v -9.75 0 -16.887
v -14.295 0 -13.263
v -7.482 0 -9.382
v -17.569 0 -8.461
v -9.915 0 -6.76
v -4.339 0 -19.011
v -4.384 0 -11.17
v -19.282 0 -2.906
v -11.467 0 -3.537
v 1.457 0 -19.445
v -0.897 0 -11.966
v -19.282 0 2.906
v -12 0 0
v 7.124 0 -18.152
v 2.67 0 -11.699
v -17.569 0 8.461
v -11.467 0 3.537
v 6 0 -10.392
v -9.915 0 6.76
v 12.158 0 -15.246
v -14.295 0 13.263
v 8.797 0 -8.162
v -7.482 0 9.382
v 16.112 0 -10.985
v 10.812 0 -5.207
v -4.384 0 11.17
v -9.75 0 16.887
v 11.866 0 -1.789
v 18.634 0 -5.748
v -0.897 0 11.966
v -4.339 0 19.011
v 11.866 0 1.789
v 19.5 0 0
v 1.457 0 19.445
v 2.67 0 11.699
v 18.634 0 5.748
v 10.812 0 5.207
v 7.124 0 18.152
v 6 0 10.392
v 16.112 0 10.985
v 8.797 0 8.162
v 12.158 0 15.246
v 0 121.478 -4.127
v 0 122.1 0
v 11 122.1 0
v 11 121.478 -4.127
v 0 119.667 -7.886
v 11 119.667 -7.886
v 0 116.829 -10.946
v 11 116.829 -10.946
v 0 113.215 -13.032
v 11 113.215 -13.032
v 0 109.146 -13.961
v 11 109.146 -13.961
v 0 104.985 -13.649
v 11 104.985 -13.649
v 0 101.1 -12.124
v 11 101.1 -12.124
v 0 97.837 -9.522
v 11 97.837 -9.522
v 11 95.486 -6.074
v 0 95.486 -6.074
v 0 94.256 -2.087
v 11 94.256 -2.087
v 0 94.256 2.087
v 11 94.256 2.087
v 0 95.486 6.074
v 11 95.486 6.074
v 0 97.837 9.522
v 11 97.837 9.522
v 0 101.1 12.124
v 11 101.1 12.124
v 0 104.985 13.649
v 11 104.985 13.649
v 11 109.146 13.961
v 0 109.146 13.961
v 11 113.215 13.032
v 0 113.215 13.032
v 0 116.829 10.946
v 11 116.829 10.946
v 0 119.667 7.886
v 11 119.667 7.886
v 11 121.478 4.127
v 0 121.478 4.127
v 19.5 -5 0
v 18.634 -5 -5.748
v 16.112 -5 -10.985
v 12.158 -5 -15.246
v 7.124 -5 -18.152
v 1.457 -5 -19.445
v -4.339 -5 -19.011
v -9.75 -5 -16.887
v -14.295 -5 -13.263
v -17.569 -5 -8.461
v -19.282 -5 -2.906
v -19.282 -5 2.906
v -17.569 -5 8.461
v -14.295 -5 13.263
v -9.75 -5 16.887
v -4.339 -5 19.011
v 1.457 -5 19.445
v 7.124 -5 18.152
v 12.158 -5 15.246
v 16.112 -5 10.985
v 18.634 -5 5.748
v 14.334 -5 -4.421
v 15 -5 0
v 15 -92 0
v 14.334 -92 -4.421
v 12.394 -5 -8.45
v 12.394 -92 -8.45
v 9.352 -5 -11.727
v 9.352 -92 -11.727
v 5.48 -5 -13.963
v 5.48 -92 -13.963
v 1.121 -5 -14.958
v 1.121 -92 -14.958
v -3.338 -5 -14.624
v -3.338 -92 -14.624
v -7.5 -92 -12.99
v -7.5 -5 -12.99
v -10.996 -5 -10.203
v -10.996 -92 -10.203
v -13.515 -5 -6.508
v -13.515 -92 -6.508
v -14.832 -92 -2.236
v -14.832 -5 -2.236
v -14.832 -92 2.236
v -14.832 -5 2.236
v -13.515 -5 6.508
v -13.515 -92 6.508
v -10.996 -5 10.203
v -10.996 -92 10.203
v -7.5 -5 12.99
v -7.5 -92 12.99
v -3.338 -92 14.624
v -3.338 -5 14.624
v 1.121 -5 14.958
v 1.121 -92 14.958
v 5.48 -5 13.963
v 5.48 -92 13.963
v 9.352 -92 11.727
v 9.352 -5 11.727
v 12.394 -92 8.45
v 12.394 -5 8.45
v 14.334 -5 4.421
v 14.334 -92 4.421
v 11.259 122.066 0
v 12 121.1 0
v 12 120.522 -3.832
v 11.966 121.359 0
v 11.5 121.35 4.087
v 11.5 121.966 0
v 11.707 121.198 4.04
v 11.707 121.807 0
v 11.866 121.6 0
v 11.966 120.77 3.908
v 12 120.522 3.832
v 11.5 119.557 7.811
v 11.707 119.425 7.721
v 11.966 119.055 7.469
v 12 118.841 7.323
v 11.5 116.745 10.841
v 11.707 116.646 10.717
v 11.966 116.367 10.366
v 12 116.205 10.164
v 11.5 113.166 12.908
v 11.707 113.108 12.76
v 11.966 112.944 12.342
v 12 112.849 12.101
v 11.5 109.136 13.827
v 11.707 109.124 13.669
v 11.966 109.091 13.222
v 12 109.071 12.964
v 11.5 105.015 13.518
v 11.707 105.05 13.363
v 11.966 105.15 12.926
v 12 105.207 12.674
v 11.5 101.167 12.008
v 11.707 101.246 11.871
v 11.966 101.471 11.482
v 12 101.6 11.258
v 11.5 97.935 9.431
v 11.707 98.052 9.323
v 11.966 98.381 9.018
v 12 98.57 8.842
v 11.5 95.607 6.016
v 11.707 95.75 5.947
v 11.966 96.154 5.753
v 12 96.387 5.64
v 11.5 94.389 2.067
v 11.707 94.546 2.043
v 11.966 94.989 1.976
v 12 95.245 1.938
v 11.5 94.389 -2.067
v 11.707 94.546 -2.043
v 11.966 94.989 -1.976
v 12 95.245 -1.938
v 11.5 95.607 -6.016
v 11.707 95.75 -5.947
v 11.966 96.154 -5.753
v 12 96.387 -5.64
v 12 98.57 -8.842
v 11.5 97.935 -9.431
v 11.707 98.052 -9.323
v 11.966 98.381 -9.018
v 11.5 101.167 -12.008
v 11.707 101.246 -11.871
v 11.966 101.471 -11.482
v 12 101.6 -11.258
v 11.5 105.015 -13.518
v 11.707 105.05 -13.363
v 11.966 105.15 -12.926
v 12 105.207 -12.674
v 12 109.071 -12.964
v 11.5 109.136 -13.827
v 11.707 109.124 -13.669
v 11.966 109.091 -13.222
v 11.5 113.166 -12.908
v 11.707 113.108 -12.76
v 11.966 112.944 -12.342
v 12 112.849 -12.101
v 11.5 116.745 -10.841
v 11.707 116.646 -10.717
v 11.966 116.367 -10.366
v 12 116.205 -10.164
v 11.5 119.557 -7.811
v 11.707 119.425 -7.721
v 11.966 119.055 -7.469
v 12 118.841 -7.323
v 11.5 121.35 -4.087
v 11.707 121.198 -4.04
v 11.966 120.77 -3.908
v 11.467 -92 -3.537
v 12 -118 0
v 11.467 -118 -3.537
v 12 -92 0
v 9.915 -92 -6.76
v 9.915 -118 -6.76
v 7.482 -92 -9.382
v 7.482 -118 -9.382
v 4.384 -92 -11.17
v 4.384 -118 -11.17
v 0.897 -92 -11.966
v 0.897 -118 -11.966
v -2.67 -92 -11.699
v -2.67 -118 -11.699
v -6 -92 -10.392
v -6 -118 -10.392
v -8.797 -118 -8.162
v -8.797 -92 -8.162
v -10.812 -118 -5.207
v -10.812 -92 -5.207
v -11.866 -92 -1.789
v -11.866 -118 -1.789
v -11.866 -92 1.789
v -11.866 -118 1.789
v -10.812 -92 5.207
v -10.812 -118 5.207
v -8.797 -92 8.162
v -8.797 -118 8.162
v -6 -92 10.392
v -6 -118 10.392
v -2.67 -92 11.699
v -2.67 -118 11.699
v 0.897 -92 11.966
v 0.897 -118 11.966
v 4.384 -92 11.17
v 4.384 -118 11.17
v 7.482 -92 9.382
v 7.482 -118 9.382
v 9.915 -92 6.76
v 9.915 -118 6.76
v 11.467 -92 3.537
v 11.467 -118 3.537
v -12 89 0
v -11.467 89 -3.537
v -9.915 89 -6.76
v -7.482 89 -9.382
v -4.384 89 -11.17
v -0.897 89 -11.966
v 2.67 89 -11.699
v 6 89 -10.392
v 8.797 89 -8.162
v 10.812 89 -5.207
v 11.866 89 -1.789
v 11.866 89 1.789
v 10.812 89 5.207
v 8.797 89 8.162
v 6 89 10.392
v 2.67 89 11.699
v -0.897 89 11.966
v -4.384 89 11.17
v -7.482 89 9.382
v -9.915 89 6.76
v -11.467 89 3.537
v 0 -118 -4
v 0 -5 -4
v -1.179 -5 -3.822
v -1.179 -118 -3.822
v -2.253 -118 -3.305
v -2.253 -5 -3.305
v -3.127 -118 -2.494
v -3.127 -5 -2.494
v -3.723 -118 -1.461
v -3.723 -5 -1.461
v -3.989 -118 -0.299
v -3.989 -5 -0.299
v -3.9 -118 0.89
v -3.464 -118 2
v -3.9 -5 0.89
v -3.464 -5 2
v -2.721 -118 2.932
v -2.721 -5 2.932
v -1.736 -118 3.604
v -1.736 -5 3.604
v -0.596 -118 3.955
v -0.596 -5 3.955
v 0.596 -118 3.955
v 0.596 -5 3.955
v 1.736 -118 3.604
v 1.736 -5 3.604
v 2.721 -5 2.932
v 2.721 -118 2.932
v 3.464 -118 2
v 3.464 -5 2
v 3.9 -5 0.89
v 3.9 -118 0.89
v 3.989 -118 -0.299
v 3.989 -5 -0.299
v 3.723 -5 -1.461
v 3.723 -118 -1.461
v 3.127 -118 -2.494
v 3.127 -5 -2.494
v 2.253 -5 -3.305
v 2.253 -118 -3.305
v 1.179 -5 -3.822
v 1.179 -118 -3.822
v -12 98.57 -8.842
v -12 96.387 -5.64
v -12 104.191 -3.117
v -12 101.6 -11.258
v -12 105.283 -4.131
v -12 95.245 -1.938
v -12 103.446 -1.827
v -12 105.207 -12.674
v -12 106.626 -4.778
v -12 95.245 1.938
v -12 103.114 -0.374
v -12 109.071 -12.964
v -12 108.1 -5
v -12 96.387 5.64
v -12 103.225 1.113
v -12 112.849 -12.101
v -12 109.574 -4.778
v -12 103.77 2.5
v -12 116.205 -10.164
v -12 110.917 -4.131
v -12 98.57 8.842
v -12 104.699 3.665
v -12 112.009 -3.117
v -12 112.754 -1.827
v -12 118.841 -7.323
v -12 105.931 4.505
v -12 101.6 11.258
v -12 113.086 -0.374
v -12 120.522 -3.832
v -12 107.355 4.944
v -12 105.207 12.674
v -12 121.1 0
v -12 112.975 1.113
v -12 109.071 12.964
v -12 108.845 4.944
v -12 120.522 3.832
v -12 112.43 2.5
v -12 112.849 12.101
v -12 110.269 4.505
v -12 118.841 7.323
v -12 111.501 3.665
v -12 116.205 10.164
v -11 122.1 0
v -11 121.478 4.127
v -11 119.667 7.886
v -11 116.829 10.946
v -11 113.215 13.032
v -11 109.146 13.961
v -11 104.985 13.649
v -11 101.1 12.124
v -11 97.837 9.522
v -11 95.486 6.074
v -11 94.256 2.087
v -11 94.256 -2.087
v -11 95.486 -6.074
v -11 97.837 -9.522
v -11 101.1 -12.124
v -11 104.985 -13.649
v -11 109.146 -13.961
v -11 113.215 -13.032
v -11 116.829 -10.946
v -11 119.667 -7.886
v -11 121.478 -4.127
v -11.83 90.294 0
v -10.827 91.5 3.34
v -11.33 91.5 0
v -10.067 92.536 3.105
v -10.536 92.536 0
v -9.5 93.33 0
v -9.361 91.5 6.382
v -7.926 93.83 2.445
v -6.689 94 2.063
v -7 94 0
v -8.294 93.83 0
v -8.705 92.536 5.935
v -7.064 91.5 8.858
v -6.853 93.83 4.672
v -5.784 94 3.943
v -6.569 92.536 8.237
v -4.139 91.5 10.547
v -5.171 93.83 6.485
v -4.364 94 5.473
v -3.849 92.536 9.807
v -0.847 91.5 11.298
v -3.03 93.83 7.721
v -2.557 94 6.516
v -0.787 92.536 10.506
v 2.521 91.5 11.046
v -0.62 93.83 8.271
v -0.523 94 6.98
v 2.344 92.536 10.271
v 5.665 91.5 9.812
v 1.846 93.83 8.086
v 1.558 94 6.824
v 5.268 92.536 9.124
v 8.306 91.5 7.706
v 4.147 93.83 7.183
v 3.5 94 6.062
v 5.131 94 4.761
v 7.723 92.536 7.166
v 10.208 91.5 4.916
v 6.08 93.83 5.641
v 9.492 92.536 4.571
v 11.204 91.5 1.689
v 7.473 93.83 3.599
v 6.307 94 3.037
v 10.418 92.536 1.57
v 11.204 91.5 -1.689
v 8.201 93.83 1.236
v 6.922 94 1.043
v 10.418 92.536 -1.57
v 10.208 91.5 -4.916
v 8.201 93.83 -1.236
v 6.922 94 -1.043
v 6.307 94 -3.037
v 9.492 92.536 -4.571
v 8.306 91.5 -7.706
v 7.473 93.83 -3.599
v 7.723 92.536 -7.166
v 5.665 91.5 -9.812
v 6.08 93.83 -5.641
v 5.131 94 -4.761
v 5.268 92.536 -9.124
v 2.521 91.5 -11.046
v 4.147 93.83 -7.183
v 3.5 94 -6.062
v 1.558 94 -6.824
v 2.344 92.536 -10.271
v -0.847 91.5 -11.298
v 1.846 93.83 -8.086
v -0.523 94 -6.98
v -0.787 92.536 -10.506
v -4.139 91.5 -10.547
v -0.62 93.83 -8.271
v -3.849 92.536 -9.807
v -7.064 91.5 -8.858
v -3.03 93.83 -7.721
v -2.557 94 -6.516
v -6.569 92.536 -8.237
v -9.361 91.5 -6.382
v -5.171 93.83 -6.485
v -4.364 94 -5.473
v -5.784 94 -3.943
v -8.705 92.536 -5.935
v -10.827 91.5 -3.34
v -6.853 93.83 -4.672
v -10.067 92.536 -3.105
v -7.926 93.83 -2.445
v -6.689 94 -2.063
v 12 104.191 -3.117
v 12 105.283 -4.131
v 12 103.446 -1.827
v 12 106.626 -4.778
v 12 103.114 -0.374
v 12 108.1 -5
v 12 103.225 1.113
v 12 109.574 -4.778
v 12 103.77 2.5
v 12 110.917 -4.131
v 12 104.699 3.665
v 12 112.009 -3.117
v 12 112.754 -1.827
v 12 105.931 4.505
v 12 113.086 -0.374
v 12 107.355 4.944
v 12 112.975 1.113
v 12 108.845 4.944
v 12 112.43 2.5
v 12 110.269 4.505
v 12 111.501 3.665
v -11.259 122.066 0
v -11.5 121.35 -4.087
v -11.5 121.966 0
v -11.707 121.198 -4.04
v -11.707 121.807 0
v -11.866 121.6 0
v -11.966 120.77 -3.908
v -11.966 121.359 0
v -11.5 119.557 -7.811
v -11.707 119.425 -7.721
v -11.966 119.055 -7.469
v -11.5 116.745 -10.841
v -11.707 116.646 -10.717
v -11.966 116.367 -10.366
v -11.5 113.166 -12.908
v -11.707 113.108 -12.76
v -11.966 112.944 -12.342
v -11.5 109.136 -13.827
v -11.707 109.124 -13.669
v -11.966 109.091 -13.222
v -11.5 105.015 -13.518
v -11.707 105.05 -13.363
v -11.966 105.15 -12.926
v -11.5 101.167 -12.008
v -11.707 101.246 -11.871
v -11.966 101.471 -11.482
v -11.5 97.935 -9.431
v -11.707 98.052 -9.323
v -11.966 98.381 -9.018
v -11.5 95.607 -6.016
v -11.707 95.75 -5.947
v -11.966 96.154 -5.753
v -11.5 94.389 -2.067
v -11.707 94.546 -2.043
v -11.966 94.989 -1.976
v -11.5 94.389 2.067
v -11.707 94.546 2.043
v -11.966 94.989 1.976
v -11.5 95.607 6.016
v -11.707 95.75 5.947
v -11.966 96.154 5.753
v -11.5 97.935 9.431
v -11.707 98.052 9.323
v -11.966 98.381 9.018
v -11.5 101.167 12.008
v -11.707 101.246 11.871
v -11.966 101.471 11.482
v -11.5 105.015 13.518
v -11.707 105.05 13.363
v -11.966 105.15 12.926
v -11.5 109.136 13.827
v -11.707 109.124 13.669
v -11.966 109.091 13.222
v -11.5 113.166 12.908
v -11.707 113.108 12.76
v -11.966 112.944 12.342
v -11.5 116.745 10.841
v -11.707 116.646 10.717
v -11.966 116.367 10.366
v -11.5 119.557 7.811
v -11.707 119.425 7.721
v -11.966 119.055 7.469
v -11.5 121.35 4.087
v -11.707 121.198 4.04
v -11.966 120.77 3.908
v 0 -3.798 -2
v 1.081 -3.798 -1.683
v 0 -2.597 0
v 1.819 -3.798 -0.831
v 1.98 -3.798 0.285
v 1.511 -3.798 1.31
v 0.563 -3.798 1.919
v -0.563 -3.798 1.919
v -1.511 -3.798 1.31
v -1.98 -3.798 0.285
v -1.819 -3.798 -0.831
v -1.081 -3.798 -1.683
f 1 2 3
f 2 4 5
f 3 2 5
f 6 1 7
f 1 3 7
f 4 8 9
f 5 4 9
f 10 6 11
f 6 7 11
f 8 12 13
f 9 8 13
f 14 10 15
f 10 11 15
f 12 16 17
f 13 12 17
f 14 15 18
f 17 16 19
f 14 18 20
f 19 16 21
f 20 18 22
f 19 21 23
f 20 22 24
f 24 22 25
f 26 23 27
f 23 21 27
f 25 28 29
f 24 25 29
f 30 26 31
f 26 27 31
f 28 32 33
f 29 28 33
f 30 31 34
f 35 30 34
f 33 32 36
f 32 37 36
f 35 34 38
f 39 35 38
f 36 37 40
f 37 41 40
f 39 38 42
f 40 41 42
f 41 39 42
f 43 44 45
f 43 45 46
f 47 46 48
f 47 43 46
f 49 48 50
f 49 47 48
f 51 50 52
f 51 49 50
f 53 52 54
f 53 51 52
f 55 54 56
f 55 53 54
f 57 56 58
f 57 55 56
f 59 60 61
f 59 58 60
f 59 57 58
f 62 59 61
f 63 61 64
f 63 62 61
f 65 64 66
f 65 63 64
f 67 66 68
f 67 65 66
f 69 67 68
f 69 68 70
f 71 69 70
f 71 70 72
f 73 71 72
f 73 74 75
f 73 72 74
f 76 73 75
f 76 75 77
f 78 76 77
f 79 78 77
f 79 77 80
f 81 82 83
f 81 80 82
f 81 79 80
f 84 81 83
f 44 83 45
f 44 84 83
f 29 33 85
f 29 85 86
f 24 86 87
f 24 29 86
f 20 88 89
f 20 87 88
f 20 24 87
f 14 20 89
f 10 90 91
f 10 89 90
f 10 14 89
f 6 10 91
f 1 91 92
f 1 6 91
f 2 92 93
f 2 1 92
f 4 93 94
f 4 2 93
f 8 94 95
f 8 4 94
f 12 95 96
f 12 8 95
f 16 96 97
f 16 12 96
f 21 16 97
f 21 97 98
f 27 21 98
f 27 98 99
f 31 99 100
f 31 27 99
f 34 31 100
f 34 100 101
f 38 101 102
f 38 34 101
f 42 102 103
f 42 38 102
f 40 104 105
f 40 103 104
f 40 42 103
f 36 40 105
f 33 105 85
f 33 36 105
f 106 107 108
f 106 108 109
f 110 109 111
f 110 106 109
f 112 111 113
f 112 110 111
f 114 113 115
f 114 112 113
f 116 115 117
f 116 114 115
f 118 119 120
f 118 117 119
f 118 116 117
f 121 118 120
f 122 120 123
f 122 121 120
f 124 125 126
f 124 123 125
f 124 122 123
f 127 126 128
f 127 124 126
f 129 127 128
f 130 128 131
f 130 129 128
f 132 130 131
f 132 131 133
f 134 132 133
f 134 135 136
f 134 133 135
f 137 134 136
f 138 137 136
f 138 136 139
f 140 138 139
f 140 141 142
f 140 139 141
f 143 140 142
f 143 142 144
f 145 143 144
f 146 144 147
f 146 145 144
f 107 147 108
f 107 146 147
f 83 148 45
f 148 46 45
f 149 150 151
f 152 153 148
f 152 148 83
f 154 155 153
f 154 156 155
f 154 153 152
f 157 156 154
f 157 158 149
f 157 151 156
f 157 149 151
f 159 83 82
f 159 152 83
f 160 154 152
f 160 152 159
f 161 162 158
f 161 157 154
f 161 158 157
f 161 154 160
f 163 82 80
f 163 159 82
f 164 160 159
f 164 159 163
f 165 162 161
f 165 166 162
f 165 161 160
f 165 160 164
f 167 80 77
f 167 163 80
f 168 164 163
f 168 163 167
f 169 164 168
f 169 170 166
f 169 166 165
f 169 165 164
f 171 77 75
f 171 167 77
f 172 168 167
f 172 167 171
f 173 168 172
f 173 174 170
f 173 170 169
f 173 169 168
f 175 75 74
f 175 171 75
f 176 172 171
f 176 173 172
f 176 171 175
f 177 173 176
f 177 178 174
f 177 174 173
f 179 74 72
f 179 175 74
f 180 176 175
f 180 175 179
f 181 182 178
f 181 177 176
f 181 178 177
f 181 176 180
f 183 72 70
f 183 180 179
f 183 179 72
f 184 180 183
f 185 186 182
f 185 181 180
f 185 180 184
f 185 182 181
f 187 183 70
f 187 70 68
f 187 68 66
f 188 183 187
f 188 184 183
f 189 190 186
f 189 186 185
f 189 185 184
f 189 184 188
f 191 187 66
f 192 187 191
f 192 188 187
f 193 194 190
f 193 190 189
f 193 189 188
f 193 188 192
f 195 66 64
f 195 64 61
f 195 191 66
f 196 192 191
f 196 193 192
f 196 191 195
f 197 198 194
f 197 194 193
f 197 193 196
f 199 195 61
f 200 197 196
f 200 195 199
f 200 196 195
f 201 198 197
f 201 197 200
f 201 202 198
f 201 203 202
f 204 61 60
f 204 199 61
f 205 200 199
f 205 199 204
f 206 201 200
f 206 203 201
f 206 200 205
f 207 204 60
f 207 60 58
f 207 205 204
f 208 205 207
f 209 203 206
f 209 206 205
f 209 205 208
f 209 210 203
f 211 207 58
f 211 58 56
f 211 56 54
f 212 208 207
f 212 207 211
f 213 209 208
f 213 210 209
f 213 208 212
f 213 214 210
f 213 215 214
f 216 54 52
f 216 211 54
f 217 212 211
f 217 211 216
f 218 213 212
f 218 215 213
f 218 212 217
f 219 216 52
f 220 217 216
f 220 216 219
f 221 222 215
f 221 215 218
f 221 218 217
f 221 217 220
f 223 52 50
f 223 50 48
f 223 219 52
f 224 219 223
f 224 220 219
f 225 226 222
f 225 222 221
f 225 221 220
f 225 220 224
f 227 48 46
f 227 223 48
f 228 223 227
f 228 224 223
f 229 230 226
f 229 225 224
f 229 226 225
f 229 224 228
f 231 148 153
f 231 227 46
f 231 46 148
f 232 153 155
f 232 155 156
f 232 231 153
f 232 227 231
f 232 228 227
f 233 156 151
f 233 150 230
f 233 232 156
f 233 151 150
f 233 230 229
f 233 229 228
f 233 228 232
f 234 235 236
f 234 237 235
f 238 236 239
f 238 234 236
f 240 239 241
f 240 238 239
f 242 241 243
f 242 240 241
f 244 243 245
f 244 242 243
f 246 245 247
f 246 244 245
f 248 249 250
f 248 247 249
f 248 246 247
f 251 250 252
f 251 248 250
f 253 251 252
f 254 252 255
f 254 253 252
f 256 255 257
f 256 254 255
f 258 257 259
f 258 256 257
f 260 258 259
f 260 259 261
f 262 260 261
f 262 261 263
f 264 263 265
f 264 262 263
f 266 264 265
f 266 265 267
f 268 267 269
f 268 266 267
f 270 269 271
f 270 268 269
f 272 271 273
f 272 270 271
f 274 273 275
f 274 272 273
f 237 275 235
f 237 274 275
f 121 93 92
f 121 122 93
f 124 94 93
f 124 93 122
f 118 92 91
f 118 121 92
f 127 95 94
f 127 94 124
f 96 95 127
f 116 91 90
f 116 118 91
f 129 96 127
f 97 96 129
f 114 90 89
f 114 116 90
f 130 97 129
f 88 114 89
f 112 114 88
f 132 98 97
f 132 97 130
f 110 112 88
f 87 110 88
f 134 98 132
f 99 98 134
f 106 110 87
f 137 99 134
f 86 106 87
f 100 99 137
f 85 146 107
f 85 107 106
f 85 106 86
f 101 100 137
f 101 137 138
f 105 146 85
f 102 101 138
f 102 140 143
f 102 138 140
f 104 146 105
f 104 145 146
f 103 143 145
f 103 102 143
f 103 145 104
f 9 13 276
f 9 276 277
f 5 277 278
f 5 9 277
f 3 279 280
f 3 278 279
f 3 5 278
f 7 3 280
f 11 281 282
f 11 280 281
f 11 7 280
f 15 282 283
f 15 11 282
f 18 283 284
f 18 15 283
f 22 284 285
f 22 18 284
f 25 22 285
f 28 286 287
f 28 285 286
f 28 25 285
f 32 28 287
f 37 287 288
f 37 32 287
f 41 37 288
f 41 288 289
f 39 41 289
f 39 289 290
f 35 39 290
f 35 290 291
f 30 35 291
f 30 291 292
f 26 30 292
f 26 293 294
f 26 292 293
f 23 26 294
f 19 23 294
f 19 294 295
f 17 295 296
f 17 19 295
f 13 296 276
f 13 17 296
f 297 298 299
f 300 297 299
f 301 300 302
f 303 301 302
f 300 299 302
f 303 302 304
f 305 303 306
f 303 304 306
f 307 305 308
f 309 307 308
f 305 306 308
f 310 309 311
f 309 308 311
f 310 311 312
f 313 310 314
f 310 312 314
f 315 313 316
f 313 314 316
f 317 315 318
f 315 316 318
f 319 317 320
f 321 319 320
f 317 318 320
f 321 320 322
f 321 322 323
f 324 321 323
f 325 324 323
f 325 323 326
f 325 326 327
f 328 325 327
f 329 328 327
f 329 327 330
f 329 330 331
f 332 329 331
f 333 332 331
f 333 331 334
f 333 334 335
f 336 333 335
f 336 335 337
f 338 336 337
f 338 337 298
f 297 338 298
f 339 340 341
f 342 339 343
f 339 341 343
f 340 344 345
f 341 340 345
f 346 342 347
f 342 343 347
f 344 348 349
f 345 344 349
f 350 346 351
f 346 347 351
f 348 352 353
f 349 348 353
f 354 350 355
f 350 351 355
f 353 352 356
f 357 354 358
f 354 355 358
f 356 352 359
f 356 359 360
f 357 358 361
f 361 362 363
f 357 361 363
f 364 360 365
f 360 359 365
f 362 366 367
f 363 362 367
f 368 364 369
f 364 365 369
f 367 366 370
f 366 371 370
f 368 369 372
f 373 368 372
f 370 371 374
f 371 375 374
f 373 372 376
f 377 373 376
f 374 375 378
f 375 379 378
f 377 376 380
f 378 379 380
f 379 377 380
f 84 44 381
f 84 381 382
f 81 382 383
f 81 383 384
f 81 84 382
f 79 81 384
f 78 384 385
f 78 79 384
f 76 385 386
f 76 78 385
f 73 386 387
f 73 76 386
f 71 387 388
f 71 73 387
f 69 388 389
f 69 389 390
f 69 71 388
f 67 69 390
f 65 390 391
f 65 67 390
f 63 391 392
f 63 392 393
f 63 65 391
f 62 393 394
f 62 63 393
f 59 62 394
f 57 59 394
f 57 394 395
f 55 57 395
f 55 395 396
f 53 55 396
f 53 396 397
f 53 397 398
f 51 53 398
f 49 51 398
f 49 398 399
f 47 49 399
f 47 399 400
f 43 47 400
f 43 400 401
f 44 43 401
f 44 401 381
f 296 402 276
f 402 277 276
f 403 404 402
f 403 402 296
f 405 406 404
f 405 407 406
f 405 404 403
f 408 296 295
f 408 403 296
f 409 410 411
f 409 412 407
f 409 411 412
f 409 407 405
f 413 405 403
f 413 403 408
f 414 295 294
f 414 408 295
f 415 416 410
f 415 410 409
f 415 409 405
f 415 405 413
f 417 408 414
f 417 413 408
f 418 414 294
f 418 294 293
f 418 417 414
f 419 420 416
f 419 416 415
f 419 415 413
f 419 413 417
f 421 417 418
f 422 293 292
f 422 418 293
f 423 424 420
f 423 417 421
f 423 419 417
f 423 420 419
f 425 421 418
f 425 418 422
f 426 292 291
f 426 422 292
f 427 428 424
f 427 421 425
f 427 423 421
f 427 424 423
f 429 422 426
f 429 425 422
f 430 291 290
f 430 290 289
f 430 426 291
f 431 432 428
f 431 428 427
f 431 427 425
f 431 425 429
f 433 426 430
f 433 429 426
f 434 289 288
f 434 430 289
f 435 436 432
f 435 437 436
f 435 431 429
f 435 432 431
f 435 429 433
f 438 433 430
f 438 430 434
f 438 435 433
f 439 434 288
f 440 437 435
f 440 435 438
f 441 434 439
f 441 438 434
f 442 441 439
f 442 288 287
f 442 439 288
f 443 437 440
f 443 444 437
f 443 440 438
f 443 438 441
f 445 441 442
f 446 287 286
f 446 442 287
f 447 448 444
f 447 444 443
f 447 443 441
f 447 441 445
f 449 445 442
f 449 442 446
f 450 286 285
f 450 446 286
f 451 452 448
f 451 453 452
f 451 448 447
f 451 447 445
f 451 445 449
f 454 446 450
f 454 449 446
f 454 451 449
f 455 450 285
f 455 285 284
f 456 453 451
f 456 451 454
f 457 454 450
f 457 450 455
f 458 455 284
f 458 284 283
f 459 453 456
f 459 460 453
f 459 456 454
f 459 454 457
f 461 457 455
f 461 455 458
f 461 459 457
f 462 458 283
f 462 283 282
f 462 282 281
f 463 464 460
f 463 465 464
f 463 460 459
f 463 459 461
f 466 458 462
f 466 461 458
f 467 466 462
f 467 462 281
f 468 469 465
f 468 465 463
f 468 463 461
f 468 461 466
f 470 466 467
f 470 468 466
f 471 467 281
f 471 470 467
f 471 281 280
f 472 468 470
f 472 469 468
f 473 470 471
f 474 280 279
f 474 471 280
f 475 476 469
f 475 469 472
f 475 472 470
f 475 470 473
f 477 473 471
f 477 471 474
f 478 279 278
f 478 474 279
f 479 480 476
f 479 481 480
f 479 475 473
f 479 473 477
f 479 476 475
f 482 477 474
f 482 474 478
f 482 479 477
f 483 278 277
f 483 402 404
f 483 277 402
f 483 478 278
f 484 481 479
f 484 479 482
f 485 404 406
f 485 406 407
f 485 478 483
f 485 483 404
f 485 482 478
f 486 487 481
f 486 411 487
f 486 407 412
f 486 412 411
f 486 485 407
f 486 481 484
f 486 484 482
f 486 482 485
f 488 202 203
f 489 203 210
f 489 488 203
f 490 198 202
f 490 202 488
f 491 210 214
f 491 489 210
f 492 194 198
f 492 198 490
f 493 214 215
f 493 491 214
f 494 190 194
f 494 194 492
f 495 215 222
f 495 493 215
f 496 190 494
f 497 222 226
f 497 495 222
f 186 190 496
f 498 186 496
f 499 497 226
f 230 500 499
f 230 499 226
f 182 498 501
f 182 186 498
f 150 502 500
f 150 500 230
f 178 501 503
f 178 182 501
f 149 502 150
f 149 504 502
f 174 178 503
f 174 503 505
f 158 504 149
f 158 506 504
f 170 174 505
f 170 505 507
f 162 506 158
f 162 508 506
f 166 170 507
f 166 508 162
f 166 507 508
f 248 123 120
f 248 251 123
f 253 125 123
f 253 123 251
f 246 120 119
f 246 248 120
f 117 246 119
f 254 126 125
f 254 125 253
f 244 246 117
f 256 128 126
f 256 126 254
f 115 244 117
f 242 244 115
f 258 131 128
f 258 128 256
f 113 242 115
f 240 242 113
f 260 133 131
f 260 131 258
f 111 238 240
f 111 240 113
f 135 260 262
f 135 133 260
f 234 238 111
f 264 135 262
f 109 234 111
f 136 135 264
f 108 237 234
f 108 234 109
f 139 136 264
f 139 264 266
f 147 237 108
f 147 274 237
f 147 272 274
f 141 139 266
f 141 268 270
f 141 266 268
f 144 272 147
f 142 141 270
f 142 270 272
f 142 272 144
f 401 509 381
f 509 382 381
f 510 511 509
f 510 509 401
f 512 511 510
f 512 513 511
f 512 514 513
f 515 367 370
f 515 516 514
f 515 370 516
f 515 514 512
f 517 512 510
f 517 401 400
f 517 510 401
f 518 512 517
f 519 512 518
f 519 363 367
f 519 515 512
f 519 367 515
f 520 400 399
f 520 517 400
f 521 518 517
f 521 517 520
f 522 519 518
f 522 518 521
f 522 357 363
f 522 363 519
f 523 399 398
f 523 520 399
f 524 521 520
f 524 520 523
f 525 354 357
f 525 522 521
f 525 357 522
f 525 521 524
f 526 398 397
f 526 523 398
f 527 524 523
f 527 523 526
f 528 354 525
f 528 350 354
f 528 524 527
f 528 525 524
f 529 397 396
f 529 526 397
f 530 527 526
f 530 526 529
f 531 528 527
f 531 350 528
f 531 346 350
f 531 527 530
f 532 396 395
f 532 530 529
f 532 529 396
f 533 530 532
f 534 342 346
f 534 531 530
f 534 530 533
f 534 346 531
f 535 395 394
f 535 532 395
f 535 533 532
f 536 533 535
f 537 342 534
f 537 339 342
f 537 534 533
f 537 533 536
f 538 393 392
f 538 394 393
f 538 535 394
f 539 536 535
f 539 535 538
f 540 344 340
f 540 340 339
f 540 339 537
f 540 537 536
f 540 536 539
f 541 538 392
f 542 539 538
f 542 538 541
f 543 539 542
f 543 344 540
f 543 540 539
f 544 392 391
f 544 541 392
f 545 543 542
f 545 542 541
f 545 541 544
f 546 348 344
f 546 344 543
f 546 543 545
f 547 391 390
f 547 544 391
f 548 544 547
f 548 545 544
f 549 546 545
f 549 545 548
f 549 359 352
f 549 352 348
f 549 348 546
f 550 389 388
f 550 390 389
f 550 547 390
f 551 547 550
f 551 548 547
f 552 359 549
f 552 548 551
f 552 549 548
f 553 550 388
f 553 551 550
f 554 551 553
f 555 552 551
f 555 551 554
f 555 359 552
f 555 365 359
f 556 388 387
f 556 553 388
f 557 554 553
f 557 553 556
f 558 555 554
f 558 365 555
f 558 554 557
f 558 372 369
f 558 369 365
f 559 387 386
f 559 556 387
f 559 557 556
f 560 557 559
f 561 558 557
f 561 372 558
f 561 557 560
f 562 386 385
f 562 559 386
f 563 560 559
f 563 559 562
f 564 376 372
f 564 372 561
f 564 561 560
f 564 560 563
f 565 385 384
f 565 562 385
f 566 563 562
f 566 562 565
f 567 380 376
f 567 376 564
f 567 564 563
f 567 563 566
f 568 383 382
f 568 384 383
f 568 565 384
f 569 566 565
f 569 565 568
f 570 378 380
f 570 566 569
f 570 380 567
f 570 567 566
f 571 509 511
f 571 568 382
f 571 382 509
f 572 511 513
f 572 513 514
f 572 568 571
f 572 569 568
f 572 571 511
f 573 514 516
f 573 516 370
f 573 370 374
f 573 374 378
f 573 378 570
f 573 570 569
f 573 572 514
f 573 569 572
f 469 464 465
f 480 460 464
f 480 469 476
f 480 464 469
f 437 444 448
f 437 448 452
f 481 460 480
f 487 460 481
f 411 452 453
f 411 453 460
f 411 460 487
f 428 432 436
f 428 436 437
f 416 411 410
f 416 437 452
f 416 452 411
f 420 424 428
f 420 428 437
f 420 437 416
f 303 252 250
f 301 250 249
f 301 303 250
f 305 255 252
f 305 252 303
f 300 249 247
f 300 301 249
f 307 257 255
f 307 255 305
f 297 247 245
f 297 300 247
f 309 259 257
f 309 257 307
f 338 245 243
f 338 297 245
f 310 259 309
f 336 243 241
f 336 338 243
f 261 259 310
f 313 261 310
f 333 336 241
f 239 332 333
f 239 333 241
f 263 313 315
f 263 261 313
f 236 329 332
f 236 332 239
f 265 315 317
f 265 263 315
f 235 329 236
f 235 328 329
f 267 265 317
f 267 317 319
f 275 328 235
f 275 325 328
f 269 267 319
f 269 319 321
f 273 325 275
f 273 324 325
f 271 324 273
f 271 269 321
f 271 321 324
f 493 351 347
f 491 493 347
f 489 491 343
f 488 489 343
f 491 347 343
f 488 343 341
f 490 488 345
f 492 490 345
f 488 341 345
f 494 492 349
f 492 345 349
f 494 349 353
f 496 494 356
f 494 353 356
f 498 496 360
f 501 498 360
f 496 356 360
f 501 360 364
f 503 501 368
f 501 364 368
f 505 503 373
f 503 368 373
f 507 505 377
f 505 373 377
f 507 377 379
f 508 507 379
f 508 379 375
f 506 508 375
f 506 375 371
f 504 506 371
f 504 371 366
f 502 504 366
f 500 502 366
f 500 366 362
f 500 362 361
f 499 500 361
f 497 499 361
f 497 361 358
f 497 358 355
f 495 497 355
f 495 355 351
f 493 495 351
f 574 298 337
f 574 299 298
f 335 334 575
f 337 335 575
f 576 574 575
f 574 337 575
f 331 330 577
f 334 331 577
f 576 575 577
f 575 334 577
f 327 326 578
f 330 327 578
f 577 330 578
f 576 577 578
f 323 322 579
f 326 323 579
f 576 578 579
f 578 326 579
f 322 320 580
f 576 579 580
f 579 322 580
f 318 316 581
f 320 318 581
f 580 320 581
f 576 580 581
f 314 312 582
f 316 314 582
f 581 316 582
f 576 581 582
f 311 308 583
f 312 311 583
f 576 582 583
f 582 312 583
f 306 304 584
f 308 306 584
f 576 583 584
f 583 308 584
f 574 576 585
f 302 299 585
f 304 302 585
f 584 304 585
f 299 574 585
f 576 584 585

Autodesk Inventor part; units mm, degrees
ref_plane "YZ Plane" through (0, 0, 0) normal (1, 0, 0) x (0, 1, 0)
ref_plane "XZ Plane" through (0, 0, 0) normal (0, 1, 0) x (-1, 0, 0)
ref_plane "XY Plane" through (0, 0, 0) normal (0, 0, 1) x (1, 0, 0)
sketch "スケッチ1" plane through (0, 0, 0) normal (0, 1, 0) x (-1, 0, 0)
  circle A0 centre (0, 0) radius 12
  dimension "d0" = 24
extrude "押し出し1" add sketch "スケッチ1" along normal blind 94
sketch "スケッチ3" plane through (0, 0, 0) normal (1, 0, 0) x (0, 1, 0)
  circle A0 centre (108.1, 0) radius 14
  line L0 (94, -12) -> (94, 12) projected
  point P0 (0, 0)
  dimension "d3" = 28
  dimension "d4" = 14.1
extrude "押し出し2" add sketch "スケッチ3" along normal mid plane 24
sketch "スケッチ4" plane through (12, 108.1, 0) normal (1, 0, 0) x (0, 0, -1)
  point P0 (0, -108.1)
  point P1 (0, 0)
hole "穴1" at (12, 108.1, 0) direction (-1, 0, 0) diameter 10 end through all
fillet "フィレット2" radius 5 1 edges at (12, 94, 0)
fillet "フィレット3" radius 1 1 edges at (12, 94.1, 0)
fillet "フィレット4" radius 1 1 edges at (-12, 94.1, 0)
sketch "スケッチ5" plane through (0, 0, 0) normal (0, -1, 0) x (1, 0, 0)
  circle A0 centre (0, 0) radius 19.5
  dimension "d18" = 39
extrude "押し出し3" add sketch "スケッチ5" along normal blind 5
sketch "スケッチ6" plane through (0, -5, 0) normal (0, -1, 0) x (1, 0, 0)
  circle A0 centre (0, 0) radius 15
  dimension "d21" = 30
extrude "押し出し4" add sketch "スケッチ6" along normal blind 87
sketch "スケッチ7" plane through (0, -92, 0) normal (0, -1, 0) x (1, 0, 0)
  circle A0 centre (0, 0) radius 12
  dimension "d24" = 24
extrude "押し出し5" add sketch "スケッチ7" along normal blind 26
sketch "スケッチ8" plane through (0, -118, 0) normal (0, -1, 0) x (1, 0, 0)
  point P0 (0, 0)
  point P1 (0, 0)
hole "穴2" at (0, -118, 0) direction (0, 1, 0) diameter 8 depth 113 tip angle 118
properties part number "スプリングその１"
